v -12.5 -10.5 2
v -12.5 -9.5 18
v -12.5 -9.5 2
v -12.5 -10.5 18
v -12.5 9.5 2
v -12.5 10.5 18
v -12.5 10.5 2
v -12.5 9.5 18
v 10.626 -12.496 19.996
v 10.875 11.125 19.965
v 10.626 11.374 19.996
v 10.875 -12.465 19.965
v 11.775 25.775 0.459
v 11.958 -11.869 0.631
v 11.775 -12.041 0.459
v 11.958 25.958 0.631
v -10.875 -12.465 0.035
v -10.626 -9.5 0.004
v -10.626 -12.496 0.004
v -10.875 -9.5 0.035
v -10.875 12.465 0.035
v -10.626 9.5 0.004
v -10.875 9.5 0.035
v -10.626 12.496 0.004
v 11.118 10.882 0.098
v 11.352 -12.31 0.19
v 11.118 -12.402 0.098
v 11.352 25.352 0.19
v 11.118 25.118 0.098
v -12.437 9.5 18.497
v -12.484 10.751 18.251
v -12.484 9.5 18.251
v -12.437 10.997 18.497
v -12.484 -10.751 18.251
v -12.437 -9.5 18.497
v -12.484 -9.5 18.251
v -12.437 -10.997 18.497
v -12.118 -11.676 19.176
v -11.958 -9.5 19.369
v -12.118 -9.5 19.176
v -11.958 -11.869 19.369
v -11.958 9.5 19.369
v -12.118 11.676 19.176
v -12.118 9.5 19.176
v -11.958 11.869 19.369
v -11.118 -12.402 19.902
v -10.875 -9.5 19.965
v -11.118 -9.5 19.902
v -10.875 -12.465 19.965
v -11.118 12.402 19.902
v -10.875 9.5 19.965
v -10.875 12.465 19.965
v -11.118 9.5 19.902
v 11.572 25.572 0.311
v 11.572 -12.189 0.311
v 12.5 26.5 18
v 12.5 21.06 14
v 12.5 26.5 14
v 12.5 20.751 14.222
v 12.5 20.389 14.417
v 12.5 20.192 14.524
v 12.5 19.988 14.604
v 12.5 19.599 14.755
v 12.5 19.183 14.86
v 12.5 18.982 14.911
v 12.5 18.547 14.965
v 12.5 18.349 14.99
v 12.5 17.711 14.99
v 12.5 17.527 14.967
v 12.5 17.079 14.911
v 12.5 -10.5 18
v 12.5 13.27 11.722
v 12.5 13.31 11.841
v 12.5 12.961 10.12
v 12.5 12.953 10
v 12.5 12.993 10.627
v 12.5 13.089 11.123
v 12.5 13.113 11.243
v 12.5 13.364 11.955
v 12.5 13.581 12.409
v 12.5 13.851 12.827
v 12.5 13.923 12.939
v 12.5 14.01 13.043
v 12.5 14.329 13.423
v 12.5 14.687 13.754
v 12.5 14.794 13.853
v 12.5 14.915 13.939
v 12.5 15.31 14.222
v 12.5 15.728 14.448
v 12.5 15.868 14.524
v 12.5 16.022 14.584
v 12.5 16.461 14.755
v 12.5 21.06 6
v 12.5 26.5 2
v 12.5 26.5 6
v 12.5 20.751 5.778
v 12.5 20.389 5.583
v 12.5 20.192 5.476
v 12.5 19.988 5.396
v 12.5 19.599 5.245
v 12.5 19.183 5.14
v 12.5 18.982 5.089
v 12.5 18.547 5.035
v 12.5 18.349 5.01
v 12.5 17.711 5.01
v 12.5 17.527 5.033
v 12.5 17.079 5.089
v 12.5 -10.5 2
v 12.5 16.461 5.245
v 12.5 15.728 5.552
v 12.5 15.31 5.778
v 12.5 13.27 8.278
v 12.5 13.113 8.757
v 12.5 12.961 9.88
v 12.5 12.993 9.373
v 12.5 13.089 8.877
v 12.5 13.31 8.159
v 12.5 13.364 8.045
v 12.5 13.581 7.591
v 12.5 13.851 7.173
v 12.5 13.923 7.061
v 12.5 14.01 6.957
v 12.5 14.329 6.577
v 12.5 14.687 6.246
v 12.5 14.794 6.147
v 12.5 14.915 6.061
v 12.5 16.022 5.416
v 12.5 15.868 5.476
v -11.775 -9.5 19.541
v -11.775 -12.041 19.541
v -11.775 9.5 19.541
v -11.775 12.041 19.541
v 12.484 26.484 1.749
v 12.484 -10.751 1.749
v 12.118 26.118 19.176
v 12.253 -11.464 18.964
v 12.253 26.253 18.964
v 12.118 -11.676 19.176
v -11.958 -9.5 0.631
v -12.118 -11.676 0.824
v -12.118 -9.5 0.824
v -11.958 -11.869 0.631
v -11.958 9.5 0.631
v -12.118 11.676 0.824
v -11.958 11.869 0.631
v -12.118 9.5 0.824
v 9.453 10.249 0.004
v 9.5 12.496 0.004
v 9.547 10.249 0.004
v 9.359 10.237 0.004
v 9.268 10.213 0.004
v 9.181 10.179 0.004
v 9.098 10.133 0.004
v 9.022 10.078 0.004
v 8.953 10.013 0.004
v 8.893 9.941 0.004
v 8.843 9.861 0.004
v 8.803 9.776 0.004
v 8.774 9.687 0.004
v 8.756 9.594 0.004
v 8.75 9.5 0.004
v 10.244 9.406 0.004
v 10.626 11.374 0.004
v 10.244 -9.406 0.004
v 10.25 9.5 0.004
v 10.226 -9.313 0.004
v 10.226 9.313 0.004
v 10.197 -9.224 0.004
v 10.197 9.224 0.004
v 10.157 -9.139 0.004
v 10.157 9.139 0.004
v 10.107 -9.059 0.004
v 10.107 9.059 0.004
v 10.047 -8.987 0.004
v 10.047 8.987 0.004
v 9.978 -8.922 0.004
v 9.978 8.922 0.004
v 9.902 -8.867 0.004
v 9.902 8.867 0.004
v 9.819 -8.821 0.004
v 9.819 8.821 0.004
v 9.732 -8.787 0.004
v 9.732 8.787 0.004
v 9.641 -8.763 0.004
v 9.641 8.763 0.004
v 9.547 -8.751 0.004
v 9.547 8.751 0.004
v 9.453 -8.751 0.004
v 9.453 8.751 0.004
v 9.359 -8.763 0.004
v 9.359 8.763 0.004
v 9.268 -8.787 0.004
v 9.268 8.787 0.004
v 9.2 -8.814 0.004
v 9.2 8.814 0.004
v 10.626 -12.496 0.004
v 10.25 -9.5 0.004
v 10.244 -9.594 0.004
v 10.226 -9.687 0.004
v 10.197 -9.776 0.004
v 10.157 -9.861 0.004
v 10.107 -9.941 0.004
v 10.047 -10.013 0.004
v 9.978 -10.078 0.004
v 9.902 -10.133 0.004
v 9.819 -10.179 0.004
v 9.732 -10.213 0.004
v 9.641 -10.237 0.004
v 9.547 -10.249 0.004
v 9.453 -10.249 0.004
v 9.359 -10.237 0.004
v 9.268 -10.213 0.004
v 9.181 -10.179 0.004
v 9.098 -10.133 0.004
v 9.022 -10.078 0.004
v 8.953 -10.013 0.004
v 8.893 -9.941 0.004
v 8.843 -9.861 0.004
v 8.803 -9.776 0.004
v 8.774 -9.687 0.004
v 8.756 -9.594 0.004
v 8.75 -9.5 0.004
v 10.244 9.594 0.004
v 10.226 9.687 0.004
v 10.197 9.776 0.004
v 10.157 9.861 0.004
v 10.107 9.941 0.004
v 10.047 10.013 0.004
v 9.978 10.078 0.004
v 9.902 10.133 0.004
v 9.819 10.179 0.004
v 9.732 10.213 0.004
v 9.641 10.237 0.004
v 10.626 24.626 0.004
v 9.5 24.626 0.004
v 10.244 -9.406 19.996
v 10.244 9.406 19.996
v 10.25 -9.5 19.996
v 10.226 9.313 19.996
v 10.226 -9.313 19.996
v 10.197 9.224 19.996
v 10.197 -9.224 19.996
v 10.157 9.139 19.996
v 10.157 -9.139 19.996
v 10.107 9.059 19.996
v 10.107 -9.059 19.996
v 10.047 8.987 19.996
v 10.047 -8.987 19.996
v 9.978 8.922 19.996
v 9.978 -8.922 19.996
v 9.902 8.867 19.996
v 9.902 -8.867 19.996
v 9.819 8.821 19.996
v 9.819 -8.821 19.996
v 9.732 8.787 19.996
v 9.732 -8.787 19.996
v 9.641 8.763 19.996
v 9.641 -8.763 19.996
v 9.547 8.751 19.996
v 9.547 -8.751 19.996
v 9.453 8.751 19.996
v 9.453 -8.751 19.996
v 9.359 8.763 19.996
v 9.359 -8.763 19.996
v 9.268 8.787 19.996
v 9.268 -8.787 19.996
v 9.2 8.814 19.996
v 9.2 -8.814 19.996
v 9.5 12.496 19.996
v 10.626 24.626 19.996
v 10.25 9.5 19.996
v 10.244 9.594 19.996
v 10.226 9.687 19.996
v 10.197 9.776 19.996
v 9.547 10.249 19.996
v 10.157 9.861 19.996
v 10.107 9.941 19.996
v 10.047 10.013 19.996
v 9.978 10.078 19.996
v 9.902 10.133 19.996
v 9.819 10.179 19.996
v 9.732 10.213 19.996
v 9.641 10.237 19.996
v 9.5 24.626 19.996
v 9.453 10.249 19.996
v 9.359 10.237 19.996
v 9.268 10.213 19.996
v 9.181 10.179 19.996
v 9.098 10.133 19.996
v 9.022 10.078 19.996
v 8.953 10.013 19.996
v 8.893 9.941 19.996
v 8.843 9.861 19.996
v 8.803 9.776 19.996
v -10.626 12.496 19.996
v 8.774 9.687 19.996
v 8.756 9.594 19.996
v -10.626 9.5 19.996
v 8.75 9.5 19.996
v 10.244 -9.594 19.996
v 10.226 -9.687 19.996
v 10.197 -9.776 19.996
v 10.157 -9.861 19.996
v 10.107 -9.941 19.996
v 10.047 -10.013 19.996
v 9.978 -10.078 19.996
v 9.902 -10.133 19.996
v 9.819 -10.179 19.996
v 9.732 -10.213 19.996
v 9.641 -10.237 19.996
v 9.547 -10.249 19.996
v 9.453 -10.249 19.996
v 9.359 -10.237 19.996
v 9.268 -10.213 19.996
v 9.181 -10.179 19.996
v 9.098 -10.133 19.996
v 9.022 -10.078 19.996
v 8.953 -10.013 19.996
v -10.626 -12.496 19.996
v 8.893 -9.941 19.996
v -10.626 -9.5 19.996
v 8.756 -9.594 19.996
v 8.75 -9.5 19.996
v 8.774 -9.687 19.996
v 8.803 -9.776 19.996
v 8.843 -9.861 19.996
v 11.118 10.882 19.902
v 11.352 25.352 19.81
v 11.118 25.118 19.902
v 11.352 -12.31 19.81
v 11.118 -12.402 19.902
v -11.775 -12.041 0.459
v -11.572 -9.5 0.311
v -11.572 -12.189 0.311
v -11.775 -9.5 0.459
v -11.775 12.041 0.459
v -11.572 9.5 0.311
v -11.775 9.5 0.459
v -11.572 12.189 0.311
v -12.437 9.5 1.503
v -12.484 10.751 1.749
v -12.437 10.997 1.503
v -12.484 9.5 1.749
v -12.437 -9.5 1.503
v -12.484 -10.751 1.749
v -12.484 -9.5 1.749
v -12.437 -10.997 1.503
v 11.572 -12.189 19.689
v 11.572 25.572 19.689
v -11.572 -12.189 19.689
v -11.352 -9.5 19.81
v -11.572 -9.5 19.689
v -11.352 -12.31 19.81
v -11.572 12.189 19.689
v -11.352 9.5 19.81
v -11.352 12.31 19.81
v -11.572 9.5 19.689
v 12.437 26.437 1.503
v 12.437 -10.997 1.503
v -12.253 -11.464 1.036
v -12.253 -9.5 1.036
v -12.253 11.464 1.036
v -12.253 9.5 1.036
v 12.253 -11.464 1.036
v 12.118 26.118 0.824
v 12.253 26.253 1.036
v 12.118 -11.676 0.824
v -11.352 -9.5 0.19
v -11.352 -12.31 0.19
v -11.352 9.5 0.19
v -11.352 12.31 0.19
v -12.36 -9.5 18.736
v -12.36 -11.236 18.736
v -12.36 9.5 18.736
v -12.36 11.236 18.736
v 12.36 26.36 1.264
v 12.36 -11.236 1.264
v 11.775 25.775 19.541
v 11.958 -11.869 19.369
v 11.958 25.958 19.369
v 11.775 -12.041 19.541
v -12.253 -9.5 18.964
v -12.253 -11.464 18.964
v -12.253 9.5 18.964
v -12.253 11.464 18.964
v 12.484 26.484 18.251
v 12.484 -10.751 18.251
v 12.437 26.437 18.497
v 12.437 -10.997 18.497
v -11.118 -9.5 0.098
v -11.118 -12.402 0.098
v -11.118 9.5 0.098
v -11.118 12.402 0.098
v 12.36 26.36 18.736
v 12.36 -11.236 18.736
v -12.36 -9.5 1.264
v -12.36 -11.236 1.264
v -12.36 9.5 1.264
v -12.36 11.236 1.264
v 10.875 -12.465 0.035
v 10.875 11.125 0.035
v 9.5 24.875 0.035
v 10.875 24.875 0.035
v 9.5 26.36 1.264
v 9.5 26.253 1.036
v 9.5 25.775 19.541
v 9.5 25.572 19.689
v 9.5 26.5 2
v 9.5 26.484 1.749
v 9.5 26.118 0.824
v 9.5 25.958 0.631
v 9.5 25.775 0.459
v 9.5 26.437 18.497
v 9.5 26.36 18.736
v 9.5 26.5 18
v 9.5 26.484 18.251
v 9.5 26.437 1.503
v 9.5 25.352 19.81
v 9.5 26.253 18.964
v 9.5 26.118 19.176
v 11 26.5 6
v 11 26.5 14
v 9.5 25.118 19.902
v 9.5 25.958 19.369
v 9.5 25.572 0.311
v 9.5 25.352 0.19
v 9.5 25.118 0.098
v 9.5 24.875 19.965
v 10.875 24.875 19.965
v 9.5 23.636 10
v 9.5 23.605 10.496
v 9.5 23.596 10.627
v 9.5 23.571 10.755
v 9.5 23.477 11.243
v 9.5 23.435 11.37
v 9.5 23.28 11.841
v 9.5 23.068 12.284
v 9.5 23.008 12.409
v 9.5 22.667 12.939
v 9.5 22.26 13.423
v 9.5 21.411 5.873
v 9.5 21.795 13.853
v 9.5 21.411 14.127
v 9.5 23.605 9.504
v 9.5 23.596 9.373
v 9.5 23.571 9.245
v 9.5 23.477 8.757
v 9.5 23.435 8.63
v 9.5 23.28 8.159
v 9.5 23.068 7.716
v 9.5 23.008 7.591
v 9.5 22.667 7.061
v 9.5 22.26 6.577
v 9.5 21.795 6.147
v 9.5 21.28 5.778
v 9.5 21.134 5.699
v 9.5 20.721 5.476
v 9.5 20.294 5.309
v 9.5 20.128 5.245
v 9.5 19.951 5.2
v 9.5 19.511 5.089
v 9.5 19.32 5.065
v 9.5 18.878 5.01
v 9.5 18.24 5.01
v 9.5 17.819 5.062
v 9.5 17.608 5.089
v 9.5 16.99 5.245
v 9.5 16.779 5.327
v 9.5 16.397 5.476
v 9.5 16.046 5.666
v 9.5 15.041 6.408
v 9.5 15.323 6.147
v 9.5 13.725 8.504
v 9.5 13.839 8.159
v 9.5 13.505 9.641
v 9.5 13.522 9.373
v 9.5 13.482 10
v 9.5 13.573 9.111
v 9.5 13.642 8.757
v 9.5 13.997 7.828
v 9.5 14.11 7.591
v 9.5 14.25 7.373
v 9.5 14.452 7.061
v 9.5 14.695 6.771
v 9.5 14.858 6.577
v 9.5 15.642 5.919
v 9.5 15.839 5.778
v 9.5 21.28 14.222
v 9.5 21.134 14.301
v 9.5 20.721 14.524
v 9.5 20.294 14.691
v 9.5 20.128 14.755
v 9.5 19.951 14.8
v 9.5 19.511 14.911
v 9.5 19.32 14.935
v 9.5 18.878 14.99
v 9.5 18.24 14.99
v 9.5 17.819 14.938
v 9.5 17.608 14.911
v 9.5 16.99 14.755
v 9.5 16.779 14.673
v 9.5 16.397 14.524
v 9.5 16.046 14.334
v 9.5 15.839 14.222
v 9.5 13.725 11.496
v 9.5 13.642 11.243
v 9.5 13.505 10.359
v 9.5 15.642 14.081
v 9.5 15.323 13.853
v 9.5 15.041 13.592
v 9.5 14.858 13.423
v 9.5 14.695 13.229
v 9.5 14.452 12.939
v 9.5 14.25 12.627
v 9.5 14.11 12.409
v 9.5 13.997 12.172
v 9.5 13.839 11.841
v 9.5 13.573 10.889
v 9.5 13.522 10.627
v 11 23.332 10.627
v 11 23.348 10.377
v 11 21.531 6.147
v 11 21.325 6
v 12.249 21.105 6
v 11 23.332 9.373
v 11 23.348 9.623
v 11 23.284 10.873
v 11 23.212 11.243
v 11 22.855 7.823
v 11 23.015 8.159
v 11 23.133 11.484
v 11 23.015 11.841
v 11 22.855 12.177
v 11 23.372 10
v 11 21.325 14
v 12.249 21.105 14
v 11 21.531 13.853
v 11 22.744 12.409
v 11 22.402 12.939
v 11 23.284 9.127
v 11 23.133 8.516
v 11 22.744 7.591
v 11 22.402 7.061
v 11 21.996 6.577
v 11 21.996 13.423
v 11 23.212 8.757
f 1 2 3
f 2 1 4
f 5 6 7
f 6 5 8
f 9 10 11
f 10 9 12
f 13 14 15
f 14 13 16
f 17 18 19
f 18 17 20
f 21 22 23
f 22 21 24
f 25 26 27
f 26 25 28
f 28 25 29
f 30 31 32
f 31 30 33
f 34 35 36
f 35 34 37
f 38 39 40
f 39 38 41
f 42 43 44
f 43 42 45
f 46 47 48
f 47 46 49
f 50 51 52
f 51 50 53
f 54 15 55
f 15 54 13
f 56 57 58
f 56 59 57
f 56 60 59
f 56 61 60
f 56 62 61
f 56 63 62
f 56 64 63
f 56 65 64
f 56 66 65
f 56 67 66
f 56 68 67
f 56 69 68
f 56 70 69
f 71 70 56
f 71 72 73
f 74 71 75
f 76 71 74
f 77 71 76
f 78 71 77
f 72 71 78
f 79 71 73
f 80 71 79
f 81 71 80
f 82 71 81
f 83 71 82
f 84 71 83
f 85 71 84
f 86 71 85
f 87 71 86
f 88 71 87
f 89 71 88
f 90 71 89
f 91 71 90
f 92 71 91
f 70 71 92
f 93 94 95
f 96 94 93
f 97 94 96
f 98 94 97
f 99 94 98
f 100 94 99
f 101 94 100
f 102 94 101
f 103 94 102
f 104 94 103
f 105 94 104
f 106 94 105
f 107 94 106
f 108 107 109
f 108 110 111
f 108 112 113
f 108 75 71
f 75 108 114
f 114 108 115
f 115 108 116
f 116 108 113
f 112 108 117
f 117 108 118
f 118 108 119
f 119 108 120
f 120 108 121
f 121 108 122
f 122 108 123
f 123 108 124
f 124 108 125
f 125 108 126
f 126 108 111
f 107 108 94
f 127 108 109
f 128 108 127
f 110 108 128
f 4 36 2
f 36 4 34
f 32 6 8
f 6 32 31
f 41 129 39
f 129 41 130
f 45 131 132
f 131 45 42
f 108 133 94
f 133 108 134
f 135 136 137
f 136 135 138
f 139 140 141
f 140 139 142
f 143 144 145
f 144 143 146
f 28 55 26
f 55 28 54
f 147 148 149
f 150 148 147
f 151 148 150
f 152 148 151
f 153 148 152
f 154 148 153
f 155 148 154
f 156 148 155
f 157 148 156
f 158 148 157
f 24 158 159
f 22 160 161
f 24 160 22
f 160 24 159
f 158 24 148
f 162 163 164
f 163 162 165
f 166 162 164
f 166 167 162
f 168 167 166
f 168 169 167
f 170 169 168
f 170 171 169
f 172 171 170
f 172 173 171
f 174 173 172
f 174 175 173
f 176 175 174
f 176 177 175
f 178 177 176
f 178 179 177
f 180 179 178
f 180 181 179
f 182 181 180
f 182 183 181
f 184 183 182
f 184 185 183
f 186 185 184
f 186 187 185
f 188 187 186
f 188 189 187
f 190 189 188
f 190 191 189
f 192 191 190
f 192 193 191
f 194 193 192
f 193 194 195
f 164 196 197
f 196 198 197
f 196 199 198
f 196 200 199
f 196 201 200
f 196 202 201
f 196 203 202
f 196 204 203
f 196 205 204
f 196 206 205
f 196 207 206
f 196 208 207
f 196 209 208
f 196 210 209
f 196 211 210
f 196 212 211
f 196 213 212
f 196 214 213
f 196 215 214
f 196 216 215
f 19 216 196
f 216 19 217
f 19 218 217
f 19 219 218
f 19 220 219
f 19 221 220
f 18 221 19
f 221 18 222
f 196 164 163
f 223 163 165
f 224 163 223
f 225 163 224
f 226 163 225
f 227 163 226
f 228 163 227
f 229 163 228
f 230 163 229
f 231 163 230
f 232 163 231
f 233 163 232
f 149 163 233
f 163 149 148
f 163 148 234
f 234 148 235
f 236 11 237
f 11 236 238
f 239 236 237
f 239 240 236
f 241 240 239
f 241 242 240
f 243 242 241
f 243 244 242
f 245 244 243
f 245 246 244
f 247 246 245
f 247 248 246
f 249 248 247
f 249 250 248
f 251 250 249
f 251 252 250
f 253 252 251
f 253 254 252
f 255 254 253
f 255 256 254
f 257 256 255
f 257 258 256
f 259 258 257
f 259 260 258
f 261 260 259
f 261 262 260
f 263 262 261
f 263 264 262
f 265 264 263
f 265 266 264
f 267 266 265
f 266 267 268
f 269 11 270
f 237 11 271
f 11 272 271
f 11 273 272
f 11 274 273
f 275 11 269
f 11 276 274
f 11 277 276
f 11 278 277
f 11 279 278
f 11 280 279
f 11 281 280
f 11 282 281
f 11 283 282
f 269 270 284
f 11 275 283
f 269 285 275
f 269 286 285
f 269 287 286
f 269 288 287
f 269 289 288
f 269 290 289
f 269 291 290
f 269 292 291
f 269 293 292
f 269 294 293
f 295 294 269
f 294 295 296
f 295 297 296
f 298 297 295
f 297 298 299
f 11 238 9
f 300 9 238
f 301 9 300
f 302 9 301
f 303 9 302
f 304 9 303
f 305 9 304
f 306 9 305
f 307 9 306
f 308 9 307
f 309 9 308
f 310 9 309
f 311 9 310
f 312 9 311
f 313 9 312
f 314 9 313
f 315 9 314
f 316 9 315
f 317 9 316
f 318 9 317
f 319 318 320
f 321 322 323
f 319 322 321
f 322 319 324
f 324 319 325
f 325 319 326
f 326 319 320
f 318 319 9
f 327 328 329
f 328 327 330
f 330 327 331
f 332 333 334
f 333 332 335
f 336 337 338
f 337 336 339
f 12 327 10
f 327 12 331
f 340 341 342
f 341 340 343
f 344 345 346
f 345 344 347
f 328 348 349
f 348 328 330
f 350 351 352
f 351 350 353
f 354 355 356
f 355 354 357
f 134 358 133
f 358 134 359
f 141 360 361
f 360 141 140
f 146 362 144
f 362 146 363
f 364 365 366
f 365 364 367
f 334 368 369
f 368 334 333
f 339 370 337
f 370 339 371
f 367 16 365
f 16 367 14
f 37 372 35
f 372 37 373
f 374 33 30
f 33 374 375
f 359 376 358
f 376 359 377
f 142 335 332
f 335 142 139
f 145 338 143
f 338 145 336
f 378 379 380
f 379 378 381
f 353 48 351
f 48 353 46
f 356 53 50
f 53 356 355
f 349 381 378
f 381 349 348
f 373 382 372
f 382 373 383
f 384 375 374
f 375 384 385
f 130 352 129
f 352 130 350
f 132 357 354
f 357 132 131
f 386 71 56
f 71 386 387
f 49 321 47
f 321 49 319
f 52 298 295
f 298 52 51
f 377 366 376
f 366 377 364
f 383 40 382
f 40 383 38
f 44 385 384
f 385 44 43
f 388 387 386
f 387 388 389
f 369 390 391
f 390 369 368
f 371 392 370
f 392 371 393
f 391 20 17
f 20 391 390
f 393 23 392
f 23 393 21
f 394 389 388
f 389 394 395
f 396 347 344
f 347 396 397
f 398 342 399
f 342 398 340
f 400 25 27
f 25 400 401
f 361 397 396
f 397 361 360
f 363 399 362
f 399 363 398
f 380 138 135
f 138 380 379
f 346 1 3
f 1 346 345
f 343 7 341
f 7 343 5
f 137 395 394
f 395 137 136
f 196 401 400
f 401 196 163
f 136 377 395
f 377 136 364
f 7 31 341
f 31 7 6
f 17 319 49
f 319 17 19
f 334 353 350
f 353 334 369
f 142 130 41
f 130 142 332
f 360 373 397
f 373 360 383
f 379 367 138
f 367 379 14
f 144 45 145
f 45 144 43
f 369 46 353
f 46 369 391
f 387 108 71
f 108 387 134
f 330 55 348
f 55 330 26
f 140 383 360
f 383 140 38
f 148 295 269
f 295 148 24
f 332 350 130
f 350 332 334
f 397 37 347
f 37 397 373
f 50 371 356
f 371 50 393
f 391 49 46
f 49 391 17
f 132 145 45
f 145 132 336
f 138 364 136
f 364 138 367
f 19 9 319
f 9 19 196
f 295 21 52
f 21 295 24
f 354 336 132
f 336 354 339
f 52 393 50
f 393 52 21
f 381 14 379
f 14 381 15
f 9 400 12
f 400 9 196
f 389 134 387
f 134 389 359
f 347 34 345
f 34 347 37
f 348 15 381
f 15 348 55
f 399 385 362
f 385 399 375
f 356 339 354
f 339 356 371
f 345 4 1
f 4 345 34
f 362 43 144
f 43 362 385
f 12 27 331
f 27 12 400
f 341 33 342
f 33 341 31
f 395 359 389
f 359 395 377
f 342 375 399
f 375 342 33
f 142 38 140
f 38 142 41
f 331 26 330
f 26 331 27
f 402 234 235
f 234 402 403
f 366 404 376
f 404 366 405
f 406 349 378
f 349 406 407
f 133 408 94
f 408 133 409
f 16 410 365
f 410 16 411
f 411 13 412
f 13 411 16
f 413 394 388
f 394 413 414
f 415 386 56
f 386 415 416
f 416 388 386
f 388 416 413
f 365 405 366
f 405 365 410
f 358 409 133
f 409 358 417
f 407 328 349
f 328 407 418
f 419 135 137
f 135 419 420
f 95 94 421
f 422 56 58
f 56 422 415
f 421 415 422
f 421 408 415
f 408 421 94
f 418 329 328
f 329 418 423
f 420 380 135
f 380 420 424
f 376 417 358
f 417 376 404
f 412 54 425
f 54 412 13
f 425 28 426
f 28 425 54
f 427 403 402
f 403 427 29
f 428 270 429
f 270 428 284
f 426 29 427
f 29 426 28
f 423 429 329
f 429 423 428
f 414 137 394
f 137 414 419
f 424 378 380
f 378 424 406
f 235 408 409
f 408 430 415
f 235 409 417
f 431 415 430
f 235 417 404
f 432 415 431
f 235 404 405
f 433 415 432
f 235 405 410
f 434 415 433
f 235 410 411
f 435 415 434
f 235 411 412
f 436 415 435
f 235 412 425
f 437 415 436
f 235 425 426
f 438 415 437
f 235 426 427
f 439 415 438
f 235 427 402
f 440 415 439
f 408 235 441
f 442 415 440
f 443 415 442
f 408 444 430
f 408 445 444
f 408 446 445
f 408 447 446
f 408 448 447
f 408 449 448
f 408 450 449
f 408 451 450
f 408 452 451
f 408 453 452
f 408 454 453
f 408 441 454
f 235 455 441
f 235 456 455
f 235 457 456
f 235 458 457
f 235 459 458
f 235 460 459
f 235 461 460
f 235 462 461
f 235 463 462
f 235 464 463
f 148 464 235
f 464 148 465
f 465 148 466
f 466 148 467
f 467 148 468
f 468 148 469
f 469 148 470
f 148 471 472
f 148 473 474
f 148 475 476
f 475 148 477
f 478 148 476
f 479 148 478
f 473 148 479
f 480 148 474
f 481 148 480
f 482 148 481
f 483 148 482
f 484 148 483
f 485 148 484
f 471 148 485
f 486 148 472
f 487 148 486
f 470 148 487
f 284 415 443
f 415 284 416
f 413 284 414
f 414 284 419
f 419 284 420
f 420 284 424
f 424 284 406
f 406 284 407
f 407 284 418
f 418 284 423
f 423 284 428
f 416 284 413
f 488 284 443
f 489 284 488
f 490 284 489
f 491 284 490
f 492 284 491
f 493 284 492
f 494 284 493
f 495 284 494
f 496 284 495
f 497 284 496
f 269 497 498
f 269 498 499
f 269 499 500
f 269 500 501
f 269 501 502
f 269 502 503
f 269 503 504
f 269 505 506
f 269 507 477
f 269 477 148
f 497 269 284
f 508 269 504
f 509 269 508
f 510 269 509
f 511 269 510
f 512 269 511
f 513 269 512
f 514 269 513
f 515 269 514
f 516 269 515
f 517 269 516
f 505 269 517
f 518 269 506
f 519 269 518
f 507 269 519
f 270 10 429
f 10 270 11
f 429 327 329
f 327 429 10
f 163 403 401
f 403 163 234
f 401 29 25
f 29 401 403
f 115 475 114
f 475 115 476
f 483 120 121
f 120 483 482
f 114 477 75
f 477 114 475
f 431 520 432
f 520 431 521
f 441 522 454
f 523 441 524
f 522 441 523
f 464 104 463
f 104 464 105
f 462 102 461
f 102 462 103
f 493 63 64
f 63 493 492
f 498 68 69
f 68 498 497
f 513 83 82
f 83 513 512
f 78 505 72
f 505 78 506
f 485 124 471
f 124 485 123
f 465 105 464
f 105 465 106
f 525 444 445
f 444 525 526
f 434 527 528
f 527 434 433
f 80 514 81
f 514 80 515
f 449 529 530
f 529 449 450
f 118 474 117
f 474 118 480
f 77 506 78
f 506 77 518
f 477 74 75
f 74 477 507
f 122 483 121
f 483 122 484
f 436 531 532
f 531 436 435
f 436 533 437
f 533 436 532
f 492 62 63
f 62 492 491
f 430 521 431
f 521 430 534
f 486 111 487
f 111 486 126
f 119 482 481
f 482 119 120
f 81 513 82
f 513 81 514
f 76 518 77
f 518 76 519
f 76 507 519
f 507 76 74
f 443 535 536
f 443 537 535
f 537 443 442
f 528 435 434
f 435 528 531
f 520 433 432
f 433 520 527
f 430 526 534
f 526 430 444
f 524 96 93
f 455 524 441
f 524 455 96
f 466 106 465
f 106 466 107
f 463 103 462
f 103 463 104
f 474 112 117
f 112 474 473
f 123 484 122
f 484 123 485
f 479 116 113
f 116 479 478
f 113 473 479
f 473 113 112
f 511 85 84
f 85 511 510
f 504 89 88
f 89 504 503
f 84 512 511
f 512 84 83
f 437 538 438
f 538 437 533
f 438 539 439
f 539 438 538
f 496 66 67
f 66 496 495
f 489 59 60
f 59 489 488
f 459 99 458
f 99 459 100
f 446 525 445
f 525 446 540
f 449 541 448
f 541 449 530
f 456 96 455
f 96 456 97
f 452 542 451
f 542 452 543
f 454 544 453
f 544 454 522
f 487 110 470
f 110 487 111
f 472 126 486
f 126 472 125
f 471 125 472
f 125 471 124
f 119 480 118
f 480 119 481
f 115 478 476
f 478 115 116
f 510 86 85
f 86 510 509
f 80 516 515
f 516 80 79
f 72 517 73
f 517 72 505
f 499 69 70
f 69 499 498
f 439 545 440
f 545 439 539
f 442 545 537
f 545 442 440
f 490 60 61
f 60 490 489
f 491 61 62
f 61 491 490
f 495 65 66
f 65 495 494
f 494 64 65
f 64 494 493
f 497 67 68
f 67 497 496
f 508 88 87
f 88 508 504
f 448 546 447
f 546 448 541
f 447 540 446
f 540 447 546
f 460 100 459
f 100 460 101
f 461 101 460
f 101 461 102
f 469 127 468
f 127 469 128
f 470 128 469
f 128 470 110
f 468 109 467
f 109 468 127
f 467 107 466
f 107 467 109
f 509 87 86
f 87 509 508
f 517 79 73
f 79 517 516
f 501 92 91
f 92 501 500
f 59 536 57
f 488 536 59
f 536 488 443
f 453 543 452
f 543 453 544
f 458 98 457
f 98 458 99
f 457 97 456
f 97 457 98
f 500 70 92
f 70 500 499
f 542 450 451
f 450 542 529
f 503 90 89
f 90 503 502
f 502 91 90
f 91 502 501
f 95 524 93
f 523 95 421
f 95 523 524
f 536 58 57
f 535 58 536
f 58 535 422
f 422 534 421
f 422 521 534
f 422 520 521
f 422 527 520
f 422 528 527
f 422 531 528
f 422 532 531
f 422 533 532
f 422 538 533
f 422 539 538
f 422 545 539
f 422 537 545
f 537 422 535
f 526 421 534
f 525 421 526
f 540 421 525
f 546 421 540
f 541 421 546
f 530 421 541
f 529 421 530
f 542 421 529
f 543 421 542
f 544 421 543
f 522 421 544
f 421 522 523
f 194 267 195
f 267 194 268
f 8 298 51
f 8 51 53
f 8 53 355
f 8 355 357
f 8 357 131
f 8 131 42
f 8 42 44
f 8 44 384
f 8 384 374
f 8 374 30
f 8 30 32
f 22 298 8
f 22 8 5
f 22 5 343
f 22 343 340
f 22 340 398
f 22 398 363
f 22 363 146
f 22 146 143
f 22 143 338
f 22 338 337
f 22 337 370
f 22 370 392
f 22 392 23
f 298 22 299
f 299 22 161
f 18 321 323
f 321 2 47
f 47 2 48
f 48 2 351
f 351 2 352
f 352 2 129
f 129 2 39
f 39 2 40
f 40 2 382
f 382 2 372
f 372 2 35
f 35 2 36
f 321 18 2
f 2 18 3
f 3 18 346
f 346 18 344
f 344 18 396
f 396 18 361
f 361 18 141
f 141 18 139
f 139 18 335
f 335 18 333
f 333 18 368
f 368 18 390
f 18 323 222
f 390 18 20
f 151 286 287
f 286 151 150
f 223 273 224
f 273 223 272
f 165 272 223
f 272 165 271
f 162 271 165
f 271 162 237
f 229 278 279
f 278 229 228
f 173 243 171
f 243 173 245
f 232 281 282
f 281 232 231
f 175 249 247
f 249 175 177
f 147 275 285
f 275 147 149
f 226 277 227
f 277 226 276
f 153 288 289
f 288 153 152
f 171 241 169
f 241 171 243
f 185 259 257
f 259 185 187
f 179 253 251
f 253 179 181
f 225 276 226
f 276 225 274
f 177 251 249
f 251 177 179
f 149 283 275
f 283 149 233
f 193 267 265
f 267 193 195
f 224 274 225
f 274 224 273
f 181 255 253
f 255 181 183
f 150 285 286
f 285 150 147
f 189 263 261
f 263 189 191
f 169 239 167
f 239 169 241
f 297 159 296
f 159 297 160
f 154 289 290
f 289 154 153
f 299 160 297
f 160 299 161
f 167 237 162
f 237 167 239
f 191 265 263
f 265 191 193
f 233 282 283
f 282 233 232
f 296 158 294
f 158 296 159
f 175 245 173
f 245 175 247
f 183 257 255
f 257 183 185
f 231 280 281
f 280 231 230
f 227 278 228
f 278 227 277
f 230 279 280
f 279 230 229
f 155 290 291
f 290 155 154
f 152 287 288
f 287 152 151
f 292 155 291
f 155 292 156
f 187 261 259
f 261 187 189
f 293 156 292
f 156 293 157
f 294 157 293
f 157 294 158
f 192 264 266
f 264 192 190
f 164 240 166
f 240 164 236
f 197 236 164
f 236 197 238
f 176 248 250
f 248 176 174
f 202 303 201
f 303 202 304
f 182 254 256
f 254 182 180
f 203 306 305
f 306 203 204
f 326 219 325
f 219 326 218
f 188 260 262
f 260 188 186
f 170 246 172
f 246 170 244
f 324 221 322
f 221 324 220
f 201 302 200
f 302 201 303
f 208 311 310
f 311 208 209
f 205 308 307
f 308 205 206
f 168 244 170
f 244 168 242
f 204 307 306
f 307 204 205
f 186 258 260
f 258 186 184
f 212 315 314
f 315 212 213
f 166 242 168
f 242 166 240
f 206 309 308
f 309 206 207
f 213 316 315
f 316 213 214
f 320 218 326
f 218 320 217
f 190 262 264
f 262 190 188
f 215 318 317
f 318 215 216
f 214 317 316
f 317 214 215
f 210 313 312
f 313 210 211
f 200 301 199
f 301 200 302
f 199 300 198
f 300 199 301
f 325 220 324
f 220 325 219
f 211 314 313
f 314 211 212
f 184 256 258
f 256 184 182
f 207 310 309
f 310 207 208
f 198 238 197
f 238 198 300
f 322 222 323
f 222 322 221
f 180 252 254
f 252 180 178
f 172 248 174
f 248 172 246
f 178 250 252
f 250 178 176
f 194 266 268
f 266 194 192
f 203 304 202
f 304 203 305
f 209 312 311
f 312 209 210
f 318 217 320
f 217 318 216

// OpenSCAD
// Cable holder

tableThick = 19;
clipThick = 3;
clipLength = 25;
cableDiam = 7;
holdLength = 2*cableDiam+clipThick;
yLength = 20;

// Position Clip to be printable
translate([0,0,0.5*yLength]) rotate([-90,0,0]) 
clip();

module clip() {
 // Base d'attache à la table
 difference() {
     union() 
     {
        // cube([clipLength, yLength, tableThick+clipThick*2], true);
        intersection() {
            roundedBox(clipLength,yLength,tableThick+clipThick*2,2);
            rotate([90,0,0]) 
                roundedBox(clipLength,tableThick+clipThick*2,yLength,2);            
        }
        
        // Plateau pour accrocher le cable
        //translate([holdLength,0,(tableThick+clipThick)*0.5]) 
        translate([0.5*holdLength+clipThick-0.5,0,(tableThick+clipThick)*0.5+cableDiam])  rotate([0,90,0]) 
        { 
            difference() {
                //cube([clipLength, yLength, clipThick], true);
                // plateau support
                intersection() {
                    roundedBox(holdLength, yLength, clipThick, 2);
                    translate([0,0,-0.5*clipThick]) rotate([0,90,0]) 
                    roundedBox(clipThick*2, yLength, holdLength,2);
                }
                /* Trous pour le cable */
                // v2
                translate([-1, 0, -(clipThick+5)/2])
                        rotate([0,10,0]) cylinder(h=clipThick+5,d=cableDiam+3, $fn=50);
                /* v1 : 
                hull() {
                    translate([0, -0.25*yLength, -clipThick/2])
                        cylinder(h=clipThick,d=cableDiam, $fn=50);
                    translate([0, 0.25*yLength, -clipThick/2])
                        cylinder(h=clipThick, d=cableDiam, $fn=50);
                } */ 
                #translate([-cableDiam, 0, 0.5*clipThick]) rotate([0,0,90])
                    cube([cableDiam+1, 0.5*yLength, clipThick], true);
            }
        }
    }
    translate([-1.1*clipThick,0,0]) cube([clipLength, yLength, tableThick], true);
    #translate([clipLength/2-clipThick,yLength/2,tableThick/2]) 
        rotate([90,0,0]) 
        cylinder(h=yLength,d=1.5, $fn=50);
    #translate([clipLength/2-clipThick,yLength/2,-tableThick/2]) 
        rotate([90,0,0]) 
        cylinder(h=yLength,d=1.5, $fn=50);
 }
}

module roundedBox(x,y,z,rad){
	hull() {
        translate([-x/2+rad, y/2-rad,-z/2]) cylinder(h=z,r=rad, $fn=50);
        translate([ x/2-rad, y/2-rad,-z/2]) cylinder(h=z,r=rad, $fn=50);
        translate([-x/2+rad,-y/2+rad,-z/2]) cylinder(h=z,r=rad, $fn=50);
        translate([ x/2-rad,-y/2+rad,-z/2]) cylinder(h=z,r=rad, $fn=50);
   }
}
